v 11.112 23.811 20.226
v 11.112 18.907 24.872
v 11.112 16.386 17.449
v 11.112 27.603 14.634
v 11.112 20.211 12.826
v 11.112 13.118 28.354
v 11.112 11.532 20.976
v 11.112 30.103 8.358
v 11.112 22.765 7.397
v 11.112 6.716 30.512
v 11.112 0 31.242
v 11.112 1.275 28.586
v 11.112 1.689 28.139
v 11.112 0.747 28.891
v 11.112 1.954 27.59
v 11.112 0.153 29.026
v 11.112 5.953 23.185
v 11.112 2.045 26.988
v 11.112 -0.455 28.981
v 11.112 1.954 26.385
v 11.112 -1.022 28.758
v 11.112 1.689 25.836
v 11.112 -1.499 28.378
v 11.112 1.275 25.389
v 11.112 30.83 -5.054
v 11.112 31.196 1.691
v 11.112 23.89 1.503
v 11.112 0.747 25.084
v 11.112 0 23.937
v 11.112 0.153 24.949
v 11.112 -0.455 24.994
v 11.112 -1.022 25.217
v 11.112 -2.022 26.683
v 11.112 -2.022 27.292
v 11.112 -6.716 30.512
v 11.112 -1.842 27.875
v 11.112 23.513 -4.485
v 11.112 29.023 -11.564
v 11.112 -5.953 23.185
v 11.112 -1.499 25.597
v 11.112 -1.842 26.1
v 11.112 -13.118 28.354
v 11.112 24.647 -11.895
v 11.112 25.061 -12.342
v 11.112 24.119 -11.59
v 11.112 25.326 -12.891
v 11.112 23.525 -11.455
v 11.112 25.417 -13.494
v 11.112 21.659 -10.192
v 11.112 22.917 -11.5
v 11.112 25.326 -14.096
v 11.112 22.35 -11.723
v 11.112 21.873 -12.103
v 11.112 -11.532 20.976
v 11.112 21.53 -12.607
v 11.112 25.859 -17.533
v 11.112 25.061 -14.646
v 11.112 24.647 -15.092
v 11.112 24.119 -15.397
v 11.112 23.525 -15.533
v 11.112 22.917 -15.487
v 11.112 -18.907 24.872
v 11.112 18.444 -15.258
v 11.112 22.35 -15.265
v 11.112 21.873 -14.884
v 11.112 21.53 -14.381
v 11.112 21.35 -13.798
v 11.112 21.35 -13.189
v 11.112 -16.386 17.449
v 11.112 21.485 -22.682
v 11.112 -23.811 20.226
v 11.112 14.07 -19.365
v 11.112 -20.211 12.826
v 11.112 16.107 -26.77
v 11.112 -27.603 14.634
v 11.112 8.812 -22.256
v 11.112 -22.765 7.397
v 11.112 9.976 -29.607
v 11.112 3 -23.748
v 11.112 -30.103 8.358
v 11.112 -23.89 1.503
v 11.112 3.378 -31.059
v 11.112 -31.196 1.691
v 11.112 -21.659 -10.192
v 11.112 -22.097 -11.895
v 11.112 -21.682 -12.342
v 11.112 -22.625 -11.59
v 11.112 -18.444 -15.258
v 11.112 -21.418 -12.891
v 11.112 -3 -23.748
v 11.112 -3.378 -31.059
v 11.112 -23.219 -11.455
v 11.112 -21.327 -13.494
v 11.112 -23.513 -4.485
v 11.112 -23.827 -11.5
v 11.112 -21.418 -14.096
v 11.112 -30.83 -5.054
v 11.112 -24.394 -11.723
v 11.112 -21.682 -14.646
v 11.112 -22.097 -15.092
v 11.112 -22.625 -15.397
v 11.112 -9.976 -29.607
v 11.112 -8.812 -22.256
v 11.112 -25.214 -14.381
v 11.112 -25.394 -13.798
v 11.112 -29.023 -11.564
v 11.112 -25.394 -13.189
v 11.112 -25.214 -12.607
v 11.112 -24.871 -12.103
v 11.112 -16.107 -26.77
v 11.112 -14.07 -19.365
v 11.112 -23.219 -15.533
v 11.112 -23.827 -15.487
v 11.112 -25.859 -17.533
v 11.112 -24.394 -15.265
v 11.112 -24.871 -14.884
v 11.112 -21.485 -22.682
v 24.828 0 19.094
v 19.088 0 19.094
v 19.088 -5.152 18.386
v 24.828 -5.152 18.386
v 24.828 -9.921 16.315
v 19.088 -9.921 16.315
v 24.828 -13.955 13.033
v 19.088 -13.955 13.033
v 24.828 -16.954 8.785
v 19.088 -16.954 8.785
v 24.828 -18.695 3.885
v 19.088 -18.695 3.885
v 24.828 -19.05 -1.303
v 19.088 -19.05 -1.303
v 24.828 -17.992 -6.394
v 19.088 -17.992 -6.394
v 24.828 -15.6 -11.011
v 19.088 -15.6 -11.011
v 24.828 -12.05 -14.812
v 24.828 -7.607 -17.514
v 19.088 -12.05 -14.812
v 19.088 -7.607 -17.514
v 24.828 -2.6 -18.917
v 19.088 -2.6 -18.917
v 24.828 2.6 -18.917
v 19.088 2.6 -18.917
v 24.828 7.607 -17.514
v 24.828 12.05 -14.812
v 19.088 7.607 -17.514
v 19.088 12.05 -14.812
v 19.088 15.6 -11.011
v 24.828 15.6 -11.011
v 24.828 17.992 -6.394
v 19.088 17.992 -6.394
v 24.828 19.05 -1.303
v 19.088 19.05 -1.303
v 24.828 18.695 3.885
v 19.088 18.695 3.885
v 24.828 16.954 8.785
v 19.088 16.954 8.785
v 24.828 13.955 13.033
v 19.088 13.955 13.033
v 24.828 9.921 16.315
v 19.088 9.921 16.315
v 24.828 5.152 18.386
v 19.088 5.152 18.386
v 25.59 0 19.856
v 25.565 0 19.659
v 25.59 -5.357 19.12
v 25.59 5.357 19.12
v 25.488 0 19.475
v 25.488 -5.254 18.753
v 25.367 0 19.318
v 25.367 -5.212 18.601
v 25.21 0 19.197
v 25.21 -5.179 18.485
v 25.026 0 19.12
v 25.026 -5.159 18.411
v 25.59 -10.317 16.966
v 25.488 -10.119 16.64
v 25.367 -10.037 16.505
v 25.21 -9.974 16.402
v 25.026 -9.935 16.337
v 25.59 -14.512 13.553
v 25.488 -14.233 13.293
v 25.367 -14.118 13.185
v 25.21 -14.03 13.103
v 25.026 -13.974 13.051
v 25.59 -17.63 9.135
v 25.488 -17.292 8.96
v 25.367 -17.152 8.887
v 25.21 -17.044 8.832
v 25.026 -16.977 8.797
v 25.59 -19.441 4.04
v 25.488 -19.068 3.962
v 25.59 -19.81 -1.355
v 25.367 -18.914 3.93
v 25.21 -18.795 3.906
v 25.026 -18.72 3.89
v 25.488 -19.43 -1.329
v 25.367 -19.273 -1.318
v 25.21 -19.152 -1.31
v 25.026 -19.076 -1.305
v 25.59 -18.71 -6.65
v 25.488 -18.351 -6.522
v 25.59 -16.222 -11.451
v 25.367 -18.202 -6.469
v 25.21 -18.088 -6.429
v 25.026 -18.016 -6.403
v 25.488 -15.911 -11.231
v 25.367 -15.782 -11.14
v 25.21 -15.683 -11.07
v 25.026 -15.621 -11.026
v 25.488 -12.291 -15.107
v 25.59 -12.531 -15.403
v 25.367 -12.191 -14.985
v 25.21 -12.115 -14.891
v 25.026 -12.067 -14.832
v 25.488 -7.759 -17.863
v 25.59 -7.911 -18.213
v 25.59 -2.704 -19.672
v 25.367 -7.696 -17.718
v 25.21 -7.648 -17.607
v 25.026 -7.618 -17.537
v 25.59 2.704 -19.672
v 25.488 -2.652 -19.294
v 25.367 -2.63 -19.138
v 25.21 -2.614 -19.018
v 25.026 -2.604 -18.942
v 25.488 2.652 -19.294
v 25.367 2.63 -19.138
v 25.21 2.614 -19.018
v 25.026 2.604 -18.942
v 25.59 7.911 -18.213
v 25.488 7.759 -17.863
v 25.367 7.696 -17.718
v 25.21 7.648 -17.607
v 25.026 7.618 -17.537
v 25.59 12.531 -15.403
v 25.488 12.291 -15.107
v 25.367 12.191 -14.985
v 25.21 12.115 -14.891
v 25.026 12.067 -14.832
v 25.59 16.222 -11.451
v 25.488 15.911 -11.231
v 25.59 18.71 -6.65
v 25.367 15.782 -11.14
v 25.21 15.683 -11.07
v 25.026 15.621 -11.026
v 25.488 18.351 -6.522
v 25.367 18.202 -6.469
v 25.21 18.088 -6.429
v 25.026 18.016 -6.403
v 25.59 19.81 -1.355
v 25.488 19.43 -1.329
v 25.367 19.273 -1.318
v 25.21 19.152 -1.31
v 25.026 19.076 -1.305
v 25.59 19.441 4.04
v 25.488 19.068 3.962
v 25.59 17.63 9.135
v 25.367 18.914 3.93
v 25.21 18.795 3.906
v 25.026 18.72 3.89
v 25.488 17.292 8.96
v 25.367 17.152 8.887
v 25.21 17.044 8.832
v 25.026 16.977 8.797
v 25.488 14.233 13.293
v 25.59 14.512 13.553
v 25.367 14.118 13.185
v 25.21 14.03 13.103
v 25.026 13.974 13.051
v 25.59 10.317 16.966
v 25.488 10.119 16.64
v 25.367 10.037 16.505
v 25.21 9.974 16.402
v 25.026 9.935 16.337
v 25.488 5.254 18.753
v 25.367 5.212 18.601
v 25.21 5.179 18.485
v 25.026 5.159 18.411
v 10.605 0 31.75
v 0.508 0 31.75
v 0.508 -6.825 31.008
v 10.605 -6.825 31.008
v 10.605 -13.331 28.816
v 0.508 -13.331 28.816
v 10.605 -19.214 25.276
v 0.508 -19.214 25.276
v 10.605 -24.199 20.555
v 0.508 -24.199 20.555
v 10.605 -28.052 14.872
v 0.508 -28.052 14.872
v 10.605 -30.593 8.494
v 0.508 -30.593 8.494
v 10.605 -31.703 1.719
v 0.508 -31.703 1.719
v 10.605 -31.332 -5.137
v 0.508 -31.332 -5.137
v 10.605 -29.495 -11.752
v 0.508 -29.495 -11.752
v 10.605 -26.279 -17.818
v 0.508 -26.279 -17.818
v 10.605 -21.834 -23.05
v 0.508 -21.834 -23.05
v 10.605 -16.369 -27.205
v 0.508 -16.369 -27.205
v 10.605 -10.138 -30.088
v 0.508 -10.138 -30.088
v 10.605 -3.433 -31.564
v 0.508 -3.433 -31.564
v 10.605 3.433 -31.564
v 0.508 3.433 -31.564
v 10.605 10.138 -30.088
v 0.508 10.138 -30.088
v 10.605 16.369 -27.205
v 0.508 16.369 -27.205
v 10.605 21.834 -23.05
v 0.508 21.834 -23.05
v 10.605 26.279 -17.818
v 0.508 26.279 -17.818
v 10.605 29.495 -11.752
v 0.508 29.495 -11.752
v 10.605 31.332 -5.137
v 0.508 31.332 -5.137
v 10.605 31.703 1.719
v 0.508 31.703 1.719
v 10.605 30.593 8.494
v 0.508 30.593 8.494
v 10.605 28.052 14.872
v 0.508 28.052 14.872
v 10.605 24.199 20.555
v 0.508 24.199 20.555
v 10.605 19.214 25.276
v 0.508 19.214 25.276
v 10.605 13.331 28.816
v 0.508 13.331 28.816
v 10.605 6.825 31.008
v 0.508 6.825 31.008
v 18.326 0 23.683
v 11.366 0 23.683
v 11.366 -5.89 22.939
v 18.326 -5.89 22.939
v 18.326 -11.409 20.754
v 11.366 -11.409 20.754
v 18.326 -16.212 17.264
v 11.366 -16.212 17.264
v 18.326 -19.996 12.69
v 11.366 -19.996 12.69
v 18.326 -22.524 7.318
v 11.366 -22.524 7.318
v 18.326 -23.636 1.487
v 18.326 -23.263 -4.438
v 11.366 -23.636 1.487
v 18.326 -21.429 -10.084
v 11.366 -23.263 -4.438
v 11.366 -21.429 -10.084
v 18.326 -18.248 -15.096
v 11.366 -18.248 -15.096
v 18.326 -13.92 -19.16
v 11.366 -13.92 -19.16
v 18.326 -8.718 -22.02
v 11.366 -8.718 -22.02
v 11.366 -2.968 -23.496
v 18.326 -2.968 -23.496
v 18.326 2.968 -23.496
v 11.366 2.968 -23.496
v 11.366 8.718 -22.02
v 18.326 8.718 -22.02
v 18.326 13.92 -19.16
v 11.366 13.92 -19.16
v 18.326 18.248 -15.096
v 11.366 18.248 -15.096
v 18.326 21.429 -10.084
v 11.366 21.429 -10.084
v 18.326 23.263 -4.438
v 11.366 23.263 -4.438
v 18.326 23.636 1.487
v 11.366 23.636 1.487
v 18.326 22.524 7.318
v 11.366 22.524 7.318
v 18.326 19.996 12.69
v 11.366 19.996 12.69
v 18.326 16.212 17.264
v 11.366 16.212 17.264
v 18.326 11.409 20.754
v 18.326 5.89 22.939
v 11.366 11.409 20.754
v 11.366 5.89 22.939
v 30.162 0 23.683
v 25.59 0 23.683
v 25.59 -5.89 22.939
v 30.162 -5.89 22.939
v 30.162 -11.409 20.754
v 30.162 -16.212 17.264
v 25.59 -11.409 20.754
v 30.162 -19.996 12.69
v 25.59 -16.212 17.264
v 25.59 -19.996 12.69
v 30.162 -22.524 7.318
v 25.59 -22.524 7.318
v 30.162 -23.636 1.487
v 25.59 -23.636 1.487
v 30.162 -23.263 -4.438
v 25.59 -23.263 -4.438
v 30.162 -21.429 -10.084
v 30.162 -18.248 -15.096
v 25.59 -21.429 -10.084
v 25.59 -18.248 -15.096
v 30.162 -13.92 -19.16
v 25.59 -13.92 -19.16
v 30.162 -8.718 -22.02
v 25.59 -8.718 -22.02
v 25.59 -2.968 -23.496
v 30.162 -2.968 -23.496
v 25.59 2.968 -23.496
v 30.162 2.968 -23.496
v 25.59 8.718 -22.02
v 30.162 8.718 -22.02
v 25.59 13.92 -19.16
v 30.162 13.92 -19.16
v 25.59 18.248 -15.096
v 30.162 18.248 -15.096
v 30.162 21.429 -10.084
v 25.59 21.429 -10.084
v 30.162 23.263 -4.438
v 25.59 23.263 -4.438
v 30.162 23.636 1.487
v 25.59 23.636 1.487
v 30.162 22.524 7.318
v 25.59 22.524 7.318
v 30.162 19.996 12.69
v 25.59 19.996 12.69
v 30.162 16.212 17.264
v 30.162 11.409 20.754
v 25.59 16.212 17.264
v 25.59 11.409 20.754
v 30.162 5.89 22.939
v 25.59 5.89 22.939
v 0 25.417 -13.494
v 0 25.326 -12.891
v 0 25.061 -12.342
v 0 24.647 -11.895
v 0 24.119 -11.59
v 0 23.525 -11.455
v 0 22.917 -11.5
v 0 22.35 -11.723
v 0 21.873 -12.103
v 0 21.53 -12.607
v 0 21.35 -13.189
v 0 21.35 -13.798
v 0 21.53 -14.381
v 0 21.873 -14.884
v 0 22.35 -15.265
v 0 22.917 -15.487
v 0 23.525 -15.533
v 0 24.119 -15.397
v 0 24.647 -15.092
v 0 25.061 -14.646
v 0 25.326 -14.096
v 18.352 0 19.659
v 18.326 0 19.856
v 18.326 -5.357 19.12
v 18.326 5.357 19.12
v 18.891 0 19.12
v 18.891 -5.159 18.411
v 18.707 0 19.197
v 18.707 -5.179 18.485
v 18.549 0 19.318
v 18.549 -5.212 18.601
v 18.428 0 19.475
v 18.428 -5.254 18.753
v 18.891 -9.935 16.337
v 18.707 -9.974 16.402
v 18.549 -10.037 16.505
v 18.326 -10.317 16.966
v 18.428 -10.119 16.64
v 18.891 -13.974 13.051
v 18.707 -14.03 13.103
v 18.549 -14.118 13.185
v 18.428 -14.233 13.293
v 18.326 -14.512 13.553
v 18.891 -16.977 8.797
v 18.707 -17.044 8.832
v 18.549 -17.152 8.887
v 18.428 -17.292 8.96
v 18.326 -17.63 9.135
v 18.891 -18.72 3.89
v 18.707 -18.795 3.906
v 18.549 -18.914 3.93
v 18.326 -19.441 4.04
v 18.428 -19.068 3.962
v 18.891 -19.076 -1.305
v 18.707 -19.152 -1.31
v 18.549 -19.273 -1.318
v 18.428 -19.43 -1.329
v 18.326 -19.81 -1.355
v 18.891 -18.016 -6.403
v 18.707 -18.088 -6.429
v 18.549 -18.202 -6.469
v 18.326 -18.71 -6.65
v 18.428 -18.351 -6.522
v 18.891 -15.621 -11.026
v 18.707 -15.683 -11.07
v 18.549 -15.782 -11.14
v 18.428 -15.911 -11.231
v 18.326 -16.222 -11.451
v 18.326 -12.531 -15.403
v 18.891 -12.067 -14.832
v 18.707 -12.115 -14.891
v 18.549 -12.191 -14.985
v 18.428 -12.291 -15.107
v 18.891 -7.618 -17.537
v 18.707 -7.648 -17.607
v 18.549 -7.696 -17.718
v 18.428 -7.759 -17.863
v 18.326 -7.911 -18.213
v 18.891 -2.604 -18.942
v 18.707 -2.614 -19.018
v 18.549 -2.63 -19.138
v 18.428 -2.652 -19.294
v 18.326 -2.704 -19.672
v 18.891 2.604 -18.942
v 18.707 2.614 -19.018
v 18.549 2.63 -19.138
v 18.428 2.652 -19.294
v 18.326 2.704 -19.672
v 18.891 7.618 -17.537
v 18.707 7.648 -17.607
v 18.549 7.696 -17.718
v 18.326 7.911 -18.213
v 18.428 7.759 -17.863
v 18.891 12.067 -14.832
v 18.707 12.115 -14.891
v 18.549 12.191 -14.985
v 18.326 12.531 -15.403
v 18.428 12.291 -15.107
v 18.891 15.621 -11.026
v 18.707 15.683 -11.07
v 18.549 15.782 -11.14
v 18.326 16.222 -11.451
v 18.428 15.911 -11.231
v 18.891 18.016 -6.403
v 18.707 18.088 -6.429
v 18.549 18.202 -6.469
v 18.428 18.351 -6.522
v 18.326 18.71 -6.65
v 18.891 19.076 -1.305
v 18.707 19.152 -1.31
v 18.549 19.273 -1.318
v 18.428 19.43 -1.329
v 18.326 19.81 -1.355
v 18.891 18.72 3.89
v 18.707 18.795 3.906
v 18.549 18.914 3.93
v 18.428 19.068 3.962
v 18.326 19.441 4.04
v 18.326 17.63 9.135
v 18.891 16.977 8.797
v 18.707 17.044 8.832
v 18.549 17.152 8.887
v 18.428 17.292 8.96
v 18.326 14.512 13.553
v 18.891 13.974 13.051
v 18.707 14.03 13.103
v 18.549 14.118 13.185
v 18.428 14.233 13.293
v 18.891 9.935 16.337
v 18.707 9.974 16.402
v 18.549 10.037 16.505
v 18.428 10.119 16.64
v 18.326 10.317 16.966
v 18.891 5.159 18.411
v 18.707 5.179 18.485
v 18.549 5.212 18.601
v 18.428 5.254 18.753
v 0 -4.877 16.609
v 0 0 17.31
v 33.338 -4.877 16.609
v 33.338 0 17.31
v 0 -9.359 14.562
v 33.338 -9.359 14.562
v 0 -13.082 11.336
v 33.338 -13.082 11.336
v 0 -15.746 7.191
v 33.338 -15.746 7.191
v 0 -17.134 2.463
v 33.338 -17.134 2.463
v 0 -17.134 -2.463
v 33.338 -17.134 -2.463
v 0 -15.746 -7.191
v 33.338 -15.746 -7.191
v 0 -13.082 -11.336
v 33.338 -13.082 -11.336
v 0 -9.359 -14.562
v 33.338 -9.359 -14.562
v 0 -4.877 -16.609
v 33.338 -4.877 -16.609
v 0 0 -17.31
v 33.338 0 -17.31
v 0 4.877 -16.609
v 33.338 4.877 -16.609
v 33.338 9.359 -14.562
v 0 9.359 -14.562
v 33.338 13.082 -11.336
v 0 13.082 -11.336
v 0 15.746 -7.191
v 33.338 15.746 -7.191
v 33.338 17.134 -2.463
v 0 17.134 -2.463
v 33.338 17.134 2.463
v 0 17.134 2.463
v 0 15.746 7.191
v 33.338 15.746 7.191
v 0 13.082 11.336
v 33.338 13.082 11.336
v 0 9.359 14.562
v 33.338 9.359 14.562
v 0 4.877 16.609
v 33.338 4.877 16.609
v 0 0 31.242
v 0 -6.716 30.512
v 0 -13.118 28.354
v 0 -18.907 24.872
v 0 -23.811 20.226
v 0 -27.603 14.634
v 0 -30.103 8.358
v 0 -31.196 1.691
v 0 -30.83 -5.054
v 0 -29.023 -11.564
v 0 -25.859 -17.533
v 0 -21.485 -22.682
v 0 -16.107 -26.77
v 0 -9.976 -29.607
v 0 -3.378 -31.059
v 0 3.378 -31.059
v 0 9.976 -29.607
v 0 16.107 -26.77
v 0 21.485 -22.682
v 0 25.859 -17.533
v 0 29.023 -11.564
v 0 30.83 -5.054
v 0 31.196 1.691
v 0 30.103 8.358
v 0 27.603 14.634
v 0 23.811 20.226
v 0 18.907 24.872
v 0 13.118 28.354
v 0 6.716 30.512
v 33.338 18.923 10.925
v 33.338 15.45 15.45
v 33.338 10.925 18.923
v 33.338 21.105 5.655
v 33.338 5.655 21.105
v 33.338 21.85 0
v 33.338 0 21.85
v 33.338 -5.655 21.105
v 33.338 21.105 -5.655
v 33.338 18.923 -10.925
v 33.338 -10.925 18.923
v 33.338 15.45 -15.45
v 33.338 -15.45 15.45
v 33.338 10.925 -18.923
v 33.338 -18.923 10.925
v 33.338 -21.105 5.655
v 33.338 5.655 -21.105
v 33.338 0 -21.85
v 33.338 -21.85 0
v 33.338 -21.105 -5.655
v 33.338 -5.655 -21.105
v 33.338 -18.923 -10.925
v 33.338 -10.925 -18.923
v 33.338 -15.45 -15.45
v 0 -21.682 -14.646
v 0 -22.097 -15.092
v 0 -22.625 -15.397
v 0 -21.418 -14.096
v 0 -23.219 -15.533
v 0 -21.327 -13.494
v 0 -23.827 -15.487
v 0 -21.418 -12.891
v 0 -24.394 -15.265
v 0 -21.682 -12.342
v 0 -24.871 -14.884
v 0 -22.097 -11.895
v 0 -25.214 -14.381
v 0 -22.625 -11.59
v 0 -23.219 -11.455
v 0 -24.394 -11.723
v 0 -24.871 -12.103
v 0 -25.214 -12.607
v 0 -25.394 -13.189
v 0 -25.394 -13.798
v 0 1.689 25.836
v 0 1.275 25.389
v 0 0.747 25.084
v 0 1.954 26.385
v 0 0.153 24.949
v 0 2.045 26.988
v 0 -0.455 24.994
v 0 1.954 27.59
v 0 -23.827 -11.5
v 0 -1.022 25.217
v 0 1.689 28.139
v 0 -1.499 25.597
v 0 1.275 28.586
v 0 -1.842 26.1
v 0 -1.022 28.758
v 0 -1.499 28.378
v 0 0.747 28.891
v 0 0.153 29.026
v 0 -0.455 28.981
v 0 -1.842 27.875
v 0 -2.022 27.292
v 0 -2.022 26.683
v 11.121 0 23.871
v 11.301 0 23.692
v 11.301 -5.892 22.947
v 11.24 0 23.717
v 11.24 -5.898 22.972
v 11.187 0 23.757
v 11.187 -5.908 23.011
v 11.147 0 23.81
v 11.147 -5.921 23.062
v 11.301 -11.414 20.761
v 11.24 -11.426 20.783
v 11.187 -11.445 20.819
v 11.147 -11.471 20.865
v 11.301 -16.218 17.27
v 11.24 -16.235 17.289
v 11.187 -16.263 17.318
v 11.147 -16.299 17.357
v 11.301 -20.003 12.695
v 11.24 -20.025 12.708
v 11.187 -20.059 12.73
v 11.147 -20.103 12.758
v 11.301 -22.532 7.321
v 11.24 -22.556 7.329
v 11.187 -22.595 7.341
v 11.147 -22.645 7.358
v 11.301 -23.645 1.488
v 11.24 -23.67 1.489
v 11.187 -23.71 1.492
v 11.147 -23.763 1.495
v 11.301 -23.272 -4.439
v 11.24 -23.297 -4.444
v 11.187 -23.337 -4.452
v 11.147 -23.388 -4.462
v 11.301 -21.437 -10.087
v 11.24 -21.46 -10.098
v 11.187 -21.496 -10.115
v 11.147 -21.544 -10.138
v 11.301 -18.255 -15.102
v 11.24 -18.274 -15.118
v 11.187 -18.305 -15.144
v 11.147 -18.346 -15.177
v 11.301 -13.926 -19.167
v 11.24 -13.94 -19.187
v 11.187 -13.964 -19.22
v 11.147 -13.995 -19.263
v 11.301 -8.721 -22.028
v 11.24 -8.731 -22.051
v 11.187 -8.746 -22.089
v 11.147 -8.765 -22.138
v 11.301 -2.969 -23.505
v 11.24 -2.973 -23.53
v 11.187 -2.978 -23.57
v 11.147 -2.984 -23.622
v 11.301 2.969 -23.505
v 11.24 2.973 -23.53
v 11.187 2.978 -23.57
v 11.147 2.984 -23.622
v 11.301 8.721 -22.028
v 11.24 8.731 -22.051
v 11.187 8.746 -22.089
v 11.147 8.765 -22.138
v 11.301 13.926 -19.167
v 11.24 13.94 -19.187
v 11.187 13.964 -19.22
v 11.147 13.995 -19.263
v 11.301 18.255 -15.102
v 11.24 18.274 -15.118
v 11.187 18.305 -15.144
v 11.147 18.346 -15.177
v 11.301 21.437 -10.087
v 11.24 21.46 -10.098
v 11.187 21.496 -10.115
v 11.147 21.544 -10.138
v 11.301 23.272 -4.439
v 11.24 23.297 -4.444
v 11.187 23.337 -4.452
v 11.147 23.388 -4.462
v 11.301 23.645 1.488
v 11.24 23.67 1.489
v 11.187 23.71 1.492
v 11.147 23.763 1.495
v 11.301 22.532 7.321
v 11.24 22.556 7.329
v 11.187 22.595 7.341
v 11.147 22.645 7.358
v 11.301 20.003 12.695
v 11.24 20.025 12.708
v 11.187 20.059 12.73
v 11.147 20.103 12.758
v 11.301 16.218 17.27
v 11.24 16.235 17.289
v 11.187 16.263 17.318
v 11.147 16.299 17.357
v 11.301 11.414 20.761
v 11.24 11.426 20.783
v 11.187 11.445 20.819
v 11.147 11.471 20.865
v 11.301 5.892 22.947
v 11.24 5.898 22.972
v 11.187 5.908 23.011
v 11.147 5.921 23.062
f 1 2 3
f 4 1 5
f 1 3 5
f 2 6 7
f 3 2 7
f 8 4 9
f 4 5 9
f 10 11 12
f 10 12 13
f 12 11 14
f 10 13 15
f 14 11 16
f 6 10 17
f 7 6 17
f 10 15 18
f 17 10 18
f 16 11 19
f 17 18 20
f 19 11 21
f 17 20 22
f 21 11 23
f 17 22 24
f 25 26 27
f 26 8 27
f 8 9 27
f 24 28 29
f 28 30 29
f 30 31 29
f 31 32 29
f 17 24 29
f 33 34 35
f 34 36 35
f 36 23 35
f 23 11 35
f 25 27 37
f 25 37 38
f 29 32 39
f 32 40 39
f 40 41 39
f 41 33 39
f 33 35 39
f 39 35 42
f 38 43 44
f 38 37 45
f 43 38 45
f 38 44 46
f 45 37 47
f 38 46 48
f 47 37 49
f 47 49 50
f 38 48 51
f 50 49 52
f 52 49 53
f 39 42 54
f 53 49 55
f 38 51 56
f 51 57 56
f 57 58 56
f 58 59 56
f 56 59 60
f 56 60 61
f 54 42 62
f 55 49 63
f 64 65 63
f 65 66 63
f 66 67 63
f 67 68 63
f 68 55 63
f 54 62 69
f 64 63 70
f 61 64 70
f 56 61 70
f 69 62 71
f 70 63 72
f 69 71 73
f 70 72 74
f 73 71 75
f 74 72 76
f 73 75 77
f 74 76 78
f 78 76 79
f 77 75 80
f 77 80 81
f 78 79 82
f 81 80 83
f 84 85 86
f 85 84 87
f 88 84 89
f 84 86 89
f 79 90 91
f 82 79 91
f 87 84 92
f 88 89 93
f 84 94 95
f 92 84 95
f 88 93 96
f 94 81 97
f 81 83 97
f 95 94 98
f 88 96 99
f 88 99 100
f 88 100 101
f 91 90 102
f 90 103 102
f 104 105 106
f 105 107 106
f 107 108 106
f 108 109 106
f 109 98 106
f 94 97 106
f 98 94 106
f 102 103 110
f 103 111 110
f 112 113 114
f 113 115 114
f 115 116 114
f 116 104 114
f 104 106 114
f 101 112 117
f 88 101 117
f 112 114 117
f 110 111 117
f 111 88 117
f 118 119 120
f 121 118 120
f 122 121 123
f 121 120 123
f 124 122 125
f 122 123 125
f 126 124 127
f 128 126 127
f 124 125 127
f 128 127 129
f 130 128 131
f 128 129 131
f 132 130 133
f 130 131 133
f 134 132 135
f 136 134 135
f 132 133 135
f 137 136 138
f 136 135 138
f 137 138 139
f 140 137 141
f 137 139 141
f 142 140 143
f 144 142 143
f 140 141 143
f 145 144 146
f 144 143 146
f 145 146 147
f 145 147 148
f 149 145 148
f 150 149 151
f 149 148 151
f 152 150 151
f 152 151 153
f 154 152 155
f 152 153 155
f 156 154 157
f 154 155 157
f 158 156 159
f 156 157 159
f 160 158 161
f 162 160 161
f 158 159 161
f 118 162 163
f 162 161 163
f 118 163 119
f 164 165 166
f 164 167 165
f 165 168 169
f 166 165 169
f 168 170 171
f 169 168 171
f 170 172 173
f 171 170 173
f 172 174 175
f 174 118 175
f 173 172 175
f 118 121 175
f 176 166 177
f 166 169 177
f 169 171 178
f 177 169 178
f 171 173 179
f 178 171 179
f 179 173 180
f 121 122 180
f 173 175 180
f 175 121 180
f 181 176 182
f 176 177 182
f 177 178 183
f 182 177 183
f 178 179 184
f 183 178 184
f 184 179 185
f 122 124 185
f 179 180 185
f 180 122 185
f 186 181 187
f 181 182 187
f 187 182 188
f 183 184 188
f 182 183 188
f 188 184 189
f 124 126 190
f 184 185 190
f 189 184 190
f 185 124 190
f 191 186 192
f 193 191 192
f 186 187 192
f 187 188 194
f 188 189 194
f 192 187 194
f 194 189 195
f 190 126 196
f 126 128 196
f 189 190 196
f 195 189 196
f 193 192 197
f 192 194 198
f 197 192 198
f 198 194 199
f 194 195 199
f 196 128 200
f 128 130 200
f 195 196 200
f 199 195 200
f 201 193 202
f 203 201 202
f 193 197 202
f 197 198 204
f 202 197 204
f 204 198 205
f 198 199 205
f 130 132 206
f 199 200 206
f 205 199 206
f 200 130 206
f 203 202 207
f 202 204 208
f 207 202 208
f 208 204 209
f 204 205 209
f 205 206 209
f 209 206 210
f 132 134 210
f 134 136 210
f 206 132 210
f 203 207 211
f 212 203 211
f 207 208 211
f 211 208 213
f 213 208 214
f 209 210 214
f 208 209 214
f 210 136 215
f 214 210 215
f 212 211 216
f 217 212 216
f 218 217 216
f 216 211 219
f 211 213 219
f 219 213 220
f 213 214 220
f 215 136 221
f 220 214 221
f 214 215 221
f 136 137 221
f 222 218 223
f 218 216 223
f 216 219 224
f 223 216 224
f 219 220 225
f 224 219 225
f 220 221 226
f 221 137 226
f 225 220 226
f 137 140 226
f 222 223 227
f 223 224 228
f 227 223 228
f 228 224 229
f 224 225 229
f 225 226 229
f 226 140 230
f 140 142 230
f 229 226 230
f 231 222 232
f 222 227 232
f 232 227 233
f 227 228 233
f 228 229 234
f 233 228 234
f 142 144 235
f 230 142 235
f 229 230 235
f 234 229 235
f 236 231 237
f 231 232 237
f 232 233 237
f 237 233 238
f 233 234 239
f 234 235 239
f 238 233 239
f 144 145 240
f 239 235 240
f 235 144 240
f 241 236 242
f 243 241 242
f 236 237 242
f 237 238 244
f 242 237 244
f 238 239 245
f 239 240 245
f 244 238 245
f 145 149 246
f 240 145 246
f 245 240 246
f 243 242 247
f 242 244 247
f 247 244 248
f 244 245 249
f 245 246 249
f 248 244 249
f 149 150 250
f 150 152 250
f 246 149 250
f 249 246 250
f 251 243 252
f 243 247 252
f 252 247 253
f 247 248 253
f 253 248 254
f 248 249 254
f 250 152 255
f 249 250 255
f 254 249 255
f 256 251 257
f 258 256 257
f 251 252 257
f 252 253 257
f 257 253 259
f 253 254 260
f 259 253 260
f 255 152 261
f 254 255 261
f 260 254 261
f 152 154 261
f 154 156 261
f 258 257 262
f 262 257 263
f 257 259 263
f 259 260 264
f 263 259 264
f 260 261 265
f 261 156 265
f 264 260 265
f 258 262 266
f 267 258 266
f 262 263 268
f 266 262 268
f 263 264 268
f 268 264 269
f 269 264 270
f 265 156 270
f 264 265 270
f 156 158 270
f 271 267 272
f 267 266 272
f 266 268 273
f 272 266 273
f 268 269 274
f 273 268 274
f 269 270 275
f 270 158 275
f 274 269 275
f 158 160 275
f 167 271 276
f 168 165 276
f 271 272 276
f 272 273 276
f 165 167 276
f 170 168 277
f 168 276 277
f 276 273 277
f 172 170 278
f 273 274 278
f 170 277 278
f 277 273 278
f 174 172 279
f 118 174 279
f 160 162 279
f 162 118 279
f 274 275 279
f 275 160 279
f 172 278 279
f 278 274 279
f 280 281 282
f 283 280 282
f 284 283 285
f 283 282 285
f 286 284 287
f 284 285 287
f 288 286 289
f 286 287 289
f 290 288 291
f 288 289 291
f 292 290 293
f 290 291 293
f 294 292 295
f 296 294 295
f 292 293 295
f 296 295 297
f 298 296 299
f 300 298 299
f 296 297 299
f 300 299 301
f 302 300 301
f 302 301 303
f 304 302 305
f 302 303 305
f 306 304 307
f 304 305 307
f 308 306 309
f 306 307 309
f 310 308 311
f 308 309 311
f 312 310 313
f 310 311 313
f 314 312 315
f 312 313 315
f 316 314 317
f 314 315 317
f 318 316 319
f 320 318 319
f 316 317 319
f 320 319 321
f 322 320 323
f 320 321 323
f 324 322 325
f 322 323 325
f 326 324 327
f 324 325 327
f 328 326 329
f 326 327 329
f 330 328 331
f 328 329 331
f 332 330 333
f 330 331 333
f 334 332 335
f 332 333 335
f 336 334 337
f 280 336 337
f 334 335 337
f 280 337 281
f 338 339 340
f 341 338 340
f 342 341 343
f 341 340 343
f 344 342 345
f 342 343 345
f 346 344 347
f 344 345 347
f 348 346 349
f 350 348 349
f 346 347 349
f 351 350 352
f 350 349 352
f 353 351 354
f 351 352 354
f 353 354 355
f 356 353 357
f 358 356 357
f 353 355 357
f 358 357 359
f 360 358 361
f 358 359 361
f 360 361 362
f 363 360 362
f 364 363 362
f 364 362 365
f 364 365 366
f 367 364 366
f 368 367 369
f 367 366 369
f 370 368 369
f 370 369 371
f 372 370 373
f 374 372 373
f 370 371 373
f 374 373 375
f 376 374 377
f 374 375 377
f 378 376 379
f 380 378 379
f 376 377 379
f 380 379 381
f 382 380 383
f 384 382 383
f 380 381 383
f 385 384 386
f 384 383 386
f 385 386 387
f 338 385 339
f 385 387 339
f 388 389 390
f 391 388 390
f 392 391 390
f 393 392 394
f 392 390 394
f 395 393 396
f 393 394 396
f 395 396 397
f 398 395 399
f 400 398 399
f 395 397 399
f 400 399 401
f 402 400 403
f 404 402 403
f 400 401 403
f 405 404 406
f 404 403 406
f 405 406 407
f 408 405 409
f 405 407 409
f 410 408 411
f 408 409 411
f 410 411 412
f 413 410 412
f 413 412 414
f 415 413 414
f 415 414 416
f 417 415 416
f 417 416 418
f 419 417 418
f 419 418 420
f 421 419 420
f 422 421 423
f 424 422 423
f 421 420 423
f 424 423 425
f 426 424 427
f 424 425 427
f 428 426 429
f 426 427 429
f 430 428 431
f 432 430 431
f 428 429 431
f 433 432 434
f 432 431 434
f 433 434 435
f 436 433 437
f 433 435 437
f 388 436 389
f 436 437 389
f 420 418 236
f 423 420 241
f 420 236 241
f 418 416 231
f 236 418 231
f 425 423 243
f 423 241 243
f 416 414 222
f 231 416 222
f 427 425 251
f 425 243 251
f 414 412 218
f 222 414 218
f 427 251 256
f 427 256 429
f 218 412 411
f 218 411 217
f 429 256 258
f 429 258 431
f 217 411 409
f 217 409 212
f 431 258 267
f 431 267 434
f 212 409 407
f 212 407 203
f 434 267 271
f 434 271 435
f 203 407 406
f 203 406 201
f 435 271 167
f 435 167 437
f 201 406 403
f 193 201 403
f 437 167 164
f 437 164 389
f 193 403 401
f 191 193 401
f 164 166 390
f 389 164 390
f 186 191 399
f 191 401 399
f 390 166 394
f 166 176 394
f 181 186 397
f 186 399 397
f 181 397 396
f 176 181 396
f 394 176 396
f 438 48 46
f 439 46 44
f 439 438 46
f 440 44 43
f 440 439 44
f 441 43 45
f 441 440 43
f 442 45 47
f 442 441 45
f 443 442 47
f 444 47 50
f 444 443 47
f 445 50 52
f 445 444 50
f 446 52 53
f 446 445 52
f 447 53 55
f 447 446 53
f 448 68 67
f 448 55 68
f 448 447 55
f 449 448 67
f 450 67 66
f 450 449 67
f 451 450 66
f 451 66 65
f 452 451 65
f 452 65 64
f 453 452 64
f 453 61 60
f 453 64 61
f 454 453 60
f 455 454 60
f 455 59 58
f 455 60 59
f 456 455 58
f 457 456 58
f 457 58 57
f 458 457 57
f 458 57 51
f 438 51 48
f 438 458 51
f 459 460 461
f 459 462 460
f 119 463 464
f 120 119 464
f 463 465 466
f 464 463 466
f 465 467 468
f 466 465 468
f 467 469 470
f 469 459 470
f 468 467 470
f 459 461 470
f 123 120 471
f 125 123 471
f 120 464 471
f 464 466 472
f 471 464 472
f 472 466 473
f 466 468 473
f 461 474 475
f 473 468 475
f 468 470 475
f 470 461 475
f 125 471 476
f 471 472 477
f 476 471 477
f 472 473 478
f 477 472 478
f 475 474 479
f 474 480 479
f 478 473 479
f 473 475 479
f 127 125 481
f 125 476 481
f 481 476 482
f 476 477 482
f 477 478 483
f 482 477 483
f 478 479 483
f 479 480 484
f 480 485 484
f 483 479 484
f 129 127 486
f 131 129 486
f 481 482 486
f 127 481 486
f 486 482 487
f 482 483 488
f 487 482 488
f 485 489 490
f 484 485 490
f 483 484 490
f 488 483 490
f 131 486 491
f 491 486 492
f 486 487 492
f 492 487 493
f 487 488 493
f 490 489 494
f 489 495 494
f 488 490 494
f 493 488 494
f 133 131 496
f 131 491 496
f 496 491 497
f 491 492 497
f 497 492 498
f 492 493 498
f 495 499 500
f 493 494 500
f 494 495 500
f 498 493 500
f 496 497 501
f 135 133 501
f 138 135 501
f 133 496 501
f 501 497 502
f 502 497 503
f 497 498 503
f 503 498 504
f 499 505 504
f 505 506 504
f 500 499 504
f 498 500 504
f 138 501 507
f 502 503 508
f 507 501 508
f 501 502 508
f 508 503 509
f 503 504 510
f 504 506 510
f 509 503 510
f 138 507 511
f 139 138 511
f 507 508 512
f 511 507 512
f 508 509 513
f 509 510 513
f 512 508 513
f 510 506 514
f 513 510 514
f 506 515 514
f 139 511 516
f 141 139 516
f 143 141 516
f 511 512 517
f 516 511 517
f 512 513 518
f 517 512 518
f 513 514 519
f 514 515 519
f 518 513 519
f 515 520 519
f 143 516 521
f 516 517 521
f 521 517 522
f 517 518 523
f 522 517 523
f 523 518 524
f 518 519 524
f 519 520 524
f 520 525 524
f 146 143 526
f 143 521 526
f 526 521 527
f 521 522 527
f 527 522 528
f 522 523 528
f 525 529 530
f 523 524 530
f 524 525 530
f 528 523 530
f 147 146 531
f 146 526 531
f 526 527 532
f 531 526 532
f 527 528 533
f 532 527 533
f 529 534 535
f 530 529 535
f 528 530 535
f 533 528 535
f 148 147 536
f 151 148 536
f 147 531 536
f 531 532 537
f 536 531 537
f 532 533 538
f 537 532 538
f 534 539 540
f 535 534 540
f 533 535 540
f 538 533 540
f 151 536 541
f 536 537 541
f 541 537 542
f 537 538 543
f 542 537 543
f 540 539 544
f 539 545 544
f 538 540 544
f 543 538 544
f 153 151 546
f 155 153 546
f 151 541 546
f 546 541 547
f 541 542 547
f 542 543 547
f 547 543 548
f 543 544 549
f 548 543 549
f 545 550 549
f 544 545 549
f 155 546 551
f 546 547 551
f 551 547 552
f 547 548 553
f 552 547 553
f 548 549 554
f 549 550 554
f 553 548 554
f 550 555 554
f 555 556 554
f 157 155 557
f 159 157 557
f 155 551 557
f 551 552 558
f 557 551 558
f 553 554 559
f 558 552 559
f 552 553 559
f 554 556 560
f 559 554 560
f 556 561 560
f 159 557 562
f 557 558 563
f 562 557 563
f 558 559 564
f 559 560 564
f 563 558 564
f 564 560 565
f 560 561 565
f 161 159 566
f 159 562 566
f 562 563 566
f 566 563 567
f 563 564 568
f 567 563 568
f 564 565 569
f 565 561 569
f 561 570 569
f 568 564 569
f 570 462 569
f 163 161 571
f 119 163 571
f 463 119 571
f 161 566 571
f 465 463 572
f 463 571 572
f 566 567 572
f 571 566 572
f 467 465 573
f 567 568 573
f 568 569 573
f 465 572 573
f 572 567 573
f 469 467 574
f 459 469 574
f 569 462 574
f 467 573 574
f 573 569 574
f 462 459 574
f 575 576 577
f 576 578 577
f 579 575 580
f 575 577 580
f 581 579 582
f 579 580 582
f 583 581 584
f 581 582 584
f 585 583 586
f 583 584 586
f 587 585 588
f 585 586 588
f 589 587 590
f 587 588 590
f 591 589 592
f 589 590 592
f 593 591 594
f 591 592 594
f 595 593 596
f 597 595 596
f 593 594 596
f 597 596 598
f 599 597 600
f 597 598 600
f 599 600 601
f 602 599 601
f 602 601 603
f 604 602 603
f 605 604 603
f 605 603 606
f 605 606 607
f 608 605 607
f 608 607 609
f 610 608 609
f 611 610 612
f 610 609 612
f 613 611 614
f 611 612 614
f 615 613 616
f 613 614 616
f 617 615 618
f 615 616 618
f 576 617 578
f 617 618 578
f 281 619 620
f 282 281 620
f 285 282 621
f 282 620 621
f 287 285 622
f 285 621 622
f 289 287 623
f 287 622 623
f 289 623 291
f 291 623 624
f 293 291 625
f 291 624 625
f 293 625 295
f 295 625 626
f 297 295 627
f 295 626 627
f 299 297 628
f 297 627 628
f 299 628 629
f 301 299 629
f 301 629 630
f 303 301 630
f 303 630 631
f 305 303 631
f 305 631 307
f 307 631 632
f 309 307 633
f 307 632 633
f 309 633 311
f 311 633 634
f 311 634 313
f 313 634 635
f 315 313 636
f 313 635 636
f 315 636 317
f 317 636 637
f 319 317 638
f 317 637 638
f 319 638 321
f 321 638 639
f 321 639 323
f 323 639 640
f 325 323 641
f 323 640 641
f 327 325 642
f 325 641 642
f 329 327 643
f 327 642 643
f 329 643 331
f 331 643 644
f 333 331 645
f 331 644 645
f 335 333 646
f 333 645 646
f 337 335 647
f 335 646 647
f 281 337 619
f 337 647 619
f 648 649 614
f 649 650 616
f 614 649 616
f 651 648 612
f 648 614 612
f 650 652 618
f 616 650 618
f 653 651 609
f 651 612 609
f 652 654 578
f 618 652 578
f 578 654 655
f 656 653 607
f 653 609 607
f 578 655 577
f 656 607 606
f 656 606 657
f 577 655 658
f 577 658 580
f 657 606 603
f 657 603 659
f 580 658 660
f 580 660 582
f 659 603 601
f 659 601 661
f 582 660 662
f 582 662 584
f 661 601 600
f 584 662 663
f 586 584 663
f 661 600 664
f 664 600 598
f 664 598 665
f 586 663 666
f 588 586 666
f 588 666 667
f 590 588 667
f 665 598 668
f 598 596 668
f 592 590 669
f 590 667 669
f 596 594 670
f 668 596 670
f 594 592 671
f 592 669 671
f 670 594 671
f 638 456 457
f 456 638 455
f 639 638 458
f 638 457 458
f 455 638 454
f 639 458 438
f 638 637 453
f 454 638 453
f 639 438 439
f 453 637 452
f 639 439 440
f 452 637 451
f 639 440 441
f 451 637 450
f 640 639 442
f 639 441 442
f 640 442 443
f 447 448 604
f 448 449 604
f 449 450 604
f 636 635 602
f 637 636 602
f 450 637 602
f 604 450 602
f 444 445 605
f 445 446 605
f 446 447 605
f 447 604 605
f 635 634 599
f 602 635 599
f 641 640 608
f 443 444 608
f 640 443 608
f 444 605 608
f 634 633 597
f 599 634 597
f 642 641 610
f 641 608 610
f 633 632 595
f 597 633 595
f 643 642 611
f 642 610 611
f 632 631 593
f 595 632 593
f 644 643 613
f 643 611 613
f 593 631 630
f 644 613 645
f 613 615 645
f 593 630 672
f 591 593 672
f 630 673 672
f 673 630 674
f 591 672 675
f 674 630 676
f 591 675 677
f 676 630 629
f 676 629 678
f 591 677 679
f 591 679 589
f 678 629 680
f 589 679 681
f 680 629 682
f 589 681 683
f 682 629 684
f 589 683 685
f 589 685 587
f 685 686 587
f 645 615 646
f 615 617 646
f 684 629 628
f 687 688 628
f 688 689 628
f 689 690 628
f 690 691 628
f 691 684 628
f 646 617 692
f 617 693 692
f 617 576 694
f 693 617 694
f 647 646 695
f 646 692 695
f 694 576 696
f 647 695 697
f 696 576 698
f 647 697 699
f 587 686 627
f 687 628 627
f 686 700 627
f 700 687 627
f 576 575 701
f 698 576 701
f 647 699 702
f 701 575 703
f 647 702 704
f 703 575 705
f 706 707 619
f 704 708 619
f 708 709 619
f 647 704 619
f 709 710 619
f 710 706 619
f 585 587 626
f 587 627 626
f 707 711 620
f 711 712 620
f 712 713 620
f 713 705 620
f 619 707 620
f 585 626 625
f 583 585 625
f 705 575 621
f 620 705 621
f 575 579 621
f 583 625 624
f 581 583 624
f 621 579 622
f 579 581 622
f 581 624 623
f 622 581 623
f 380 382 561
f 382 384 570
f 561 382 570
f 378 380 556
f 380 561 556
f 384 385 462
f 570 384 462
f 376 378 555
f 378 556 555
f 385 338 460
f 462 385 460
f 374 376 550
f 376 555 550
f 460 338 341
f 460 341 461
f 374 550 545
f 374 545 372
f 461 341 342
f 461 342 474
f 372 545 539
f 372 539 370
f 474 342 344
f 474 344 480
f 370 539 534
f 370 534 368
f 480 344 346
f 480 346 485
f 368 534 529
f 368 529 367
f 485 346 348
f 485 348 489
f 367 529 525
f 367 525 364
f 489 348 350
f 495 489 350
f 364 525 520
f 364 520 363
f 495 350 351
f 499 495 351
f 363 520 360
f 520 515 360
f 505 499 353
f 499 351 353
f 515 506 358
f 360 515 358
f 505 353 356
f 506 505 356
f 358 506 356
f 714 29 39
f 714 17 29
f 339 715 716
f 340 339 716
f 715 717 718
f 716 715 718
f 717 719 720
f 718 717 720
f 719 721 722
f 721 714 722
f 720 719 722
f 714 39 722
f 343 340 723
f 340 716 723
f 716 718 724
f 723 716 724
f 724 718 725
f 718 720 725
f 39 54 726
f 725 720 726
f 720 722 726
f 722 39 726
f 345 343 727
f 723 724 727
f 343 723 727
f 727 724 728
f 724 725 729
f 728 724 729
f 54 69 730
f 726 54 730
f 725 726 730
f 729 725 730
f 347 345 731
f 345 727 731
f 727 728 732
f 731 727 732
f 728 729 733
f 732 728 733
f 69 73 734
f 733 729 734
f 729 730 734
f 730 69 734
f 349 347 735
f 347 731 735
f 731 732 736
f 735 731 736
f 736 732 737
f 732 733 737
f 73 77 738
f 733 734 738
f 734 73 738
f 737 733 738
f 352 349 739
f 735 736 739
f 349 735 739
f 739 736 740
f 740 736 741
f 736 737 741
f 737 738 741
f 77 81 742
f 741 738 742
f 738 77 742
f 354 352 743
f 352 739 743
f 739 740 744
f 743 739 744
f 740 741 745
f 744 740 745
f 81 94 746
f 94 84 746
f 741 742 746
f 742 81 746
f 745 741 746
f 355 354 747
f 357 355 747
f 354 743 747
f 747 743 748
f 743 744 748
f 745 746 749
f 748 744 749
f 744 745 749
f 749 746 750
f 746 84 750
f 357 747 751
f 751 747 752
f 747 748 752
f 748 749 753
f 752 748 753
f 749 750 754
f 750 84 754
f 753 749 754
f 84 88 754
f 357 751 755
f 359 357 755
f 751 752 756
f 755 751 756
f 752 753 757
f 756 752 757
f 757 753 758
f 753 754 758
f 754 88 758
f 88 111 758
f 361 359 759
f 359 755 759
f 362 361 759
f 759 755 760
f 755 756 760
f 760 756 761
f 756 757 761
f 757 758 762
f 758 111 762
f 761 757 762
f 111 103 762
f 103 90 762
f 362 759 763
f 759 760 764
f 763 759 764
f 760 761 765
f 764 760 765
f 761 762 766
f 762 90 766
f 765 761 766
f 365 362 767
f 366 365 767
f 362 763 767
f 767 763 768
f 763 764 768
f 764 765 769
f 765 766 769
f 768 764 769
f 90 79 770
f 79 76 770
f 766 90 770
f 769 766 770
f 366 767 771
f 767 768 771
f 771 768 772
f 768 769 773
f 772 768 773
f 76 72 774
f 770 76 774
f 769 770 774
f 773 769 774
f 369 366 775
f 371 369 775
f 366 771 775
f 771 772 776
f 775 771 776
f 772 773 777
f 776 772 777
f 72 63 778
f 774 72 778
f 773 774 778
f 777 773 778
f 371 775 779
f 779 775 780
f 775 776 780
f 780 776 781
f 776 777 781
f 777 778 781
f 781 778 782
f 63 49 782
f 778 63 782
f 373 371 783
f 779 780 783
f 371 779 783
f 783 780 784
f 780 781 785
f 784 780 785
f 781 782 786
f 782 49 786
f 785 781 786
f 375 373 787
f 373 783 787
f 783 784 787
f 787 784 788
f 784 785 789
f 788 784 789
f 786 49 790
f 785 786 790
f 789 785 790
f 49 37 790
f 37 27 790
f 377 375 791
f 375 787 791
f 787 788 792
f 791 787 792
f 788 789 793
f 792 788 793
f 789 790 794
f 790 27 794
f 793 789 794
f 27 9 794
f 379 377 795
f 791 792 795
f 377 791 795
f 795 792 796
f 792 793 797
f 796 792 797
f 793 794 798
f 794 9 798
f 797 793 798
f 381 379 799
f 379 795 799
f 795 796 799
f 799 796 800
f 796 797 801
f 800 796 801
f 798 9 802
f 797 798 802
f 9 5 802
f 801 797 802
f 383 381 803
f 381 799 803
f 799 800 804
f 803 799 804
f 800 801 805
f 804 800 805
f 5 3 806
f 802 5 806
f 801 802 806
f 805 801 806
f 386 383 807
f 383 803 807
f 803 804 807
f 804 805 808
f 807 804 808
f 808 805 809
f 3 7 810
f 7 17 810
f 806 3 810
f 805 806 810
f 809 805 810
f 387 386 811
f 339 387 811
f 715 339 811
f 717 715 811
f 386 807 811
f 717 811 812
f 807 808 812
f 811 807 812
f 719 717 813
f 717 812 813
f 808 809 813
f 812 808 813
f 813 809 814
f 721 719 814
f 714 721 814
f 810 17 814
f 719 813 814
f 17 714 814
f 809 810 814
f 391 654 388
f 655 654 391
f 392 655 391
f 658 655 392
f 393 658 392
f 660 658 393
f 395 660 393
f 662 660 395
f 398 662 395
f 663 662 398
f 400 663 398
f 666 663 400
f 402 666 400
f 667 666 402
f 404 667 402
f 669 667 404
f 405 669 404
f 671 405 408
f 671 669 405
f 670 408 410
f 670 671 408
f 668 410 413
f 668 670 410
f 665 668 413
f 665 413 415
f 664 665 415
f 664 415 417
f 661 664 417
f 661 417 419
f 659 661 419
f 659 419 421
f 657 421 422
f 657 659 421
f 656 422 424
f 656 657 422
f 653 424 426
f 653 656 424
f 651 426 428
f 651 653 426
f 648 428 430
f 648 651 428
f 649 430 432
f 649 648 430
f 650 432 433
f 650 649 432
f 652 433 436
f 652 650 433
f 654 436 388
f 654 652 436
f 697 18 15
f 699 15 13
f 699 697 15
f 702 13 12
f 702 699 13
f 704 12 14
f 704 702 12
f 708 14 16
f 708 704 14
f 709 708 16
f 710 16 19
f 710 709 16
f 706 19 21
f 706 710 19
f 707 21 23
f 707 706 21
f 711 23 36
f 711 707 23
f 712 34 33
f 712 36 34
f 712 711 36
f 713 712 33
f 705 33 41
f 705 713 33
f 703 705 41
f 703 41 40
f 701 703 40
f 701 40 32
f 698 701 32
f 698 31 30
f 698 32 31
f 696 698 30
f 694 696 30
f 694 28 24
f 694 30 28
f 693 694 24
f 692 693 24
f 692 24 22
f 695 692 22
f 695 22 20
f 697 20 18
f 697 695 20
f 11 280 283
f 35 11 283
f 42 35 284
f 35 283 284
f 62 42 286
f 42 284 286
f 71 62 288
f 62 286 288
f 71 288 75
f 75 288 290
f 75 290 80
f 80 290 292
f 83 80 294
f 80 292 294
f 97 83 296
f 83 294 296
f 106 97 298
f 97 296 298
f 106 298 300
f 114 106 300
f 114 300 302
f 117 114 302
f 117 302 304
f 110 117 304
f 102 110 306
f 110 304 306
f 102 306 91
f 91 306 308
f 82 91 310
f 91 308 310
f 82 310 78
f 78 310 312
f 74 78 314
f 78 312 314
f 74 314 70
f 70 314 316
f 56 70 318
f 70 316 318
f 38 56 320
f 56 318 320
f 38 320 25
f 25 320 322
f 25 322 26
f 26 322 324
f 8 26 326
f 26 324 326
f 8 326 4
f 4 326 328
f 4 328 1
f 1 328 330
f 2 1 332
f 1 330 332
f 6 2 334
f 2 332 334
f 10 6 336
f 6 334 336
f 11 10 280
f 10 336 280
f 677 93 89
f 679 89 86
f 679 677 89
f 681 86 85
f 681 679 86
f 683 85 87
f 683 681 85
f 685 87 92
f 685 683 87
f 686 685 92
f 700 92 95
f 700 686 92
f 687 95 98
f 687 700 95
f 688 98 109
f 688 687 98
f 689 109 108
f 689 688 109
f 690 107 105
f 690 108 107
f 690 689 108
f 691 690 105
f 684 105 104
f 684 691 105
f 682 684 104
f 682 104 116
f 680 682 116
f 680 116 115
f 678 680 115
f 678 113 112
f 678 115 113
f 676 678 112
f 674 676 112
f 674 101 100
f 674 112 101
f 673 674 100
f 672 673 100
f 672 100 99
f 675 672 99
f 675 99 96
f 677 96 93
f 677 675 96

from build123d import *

# Parameters (mm, degrees)
F2_SIZE2 = 1.8330871047
F2_SIZE  = 3.175
F3_R     = 0.762
F4_R     = 0.254
F5_SIZE  = 0.508
F6_R     = 2.0447
F7_DEPTH = 25.4


with BuildPart() as f1:
    # F0 (on Front) → F1 (revolve)
    with BuildSketch(Plane.XZ):
        Polygon((11.1125, 23.68296), (11.1125, 31.75), (0, 31.75), (0, 17.3101), (33.3375, 17.3101), (33.3375, 23.68296), (25.5905, 23.68296), (25.5905, 19.09445), (18.3261, 19.09445), (18.3261, 23.68296), align=None)
    revolve(axis=Axis((23.780265148, 0, 0), (1, 0, 0)))

    # F2
    f2_edges = [f1.edges().sort_by_distance(p)[0] for p in [
        (33.3375, 0, -23.68296),
    ]]
    f2_side = f1.faces().sort_by_distance((29.464, 0, -23.68296))[0]
    chamfer(f2_edges, length=F2_SIZE, length2=F2_SIZE2, reference=f2_side)

    # F3
    f3_edges = [f1.edges().sort_by_distance(p)[0] for p in [
        (18.3261, 0, -19.09445),
        (25.5905, 0, -19.09445),
    ]]
    fillet(f3_edges, radius=F3_R)

    # F4
    f4_edges = [f1.edges().sort_by_distance(p)[0] for p in [
        (11.1125, 0, -23.68296),
    ]]
    fillet(f4_edges, radius=F4_R)

    # F5
    f5_edges = [f1.edges().sort_by_distance(p)[0] for p in [
        (11.1125, 0, -31.75),
        (0, 0, -31.75),
    ]]
    chamfer(f5_edges, length=F5_SIZE)

    # F6 (on Right) → F7 (cut)
    with BuildSketch(Plane.YZ):
        with Locations((0, 26.9875)):
            Circle(F6_R)
        with Locations((23.3718605846, -13.49375)):
            Circle(F6_R)
        with Locations((-23.3718605846, -13.49375)):
            Circle(F6_R)
    extrude(amount=F7_DEPTH, mode=Mode.SUBTRACT)


solid = f1.part
